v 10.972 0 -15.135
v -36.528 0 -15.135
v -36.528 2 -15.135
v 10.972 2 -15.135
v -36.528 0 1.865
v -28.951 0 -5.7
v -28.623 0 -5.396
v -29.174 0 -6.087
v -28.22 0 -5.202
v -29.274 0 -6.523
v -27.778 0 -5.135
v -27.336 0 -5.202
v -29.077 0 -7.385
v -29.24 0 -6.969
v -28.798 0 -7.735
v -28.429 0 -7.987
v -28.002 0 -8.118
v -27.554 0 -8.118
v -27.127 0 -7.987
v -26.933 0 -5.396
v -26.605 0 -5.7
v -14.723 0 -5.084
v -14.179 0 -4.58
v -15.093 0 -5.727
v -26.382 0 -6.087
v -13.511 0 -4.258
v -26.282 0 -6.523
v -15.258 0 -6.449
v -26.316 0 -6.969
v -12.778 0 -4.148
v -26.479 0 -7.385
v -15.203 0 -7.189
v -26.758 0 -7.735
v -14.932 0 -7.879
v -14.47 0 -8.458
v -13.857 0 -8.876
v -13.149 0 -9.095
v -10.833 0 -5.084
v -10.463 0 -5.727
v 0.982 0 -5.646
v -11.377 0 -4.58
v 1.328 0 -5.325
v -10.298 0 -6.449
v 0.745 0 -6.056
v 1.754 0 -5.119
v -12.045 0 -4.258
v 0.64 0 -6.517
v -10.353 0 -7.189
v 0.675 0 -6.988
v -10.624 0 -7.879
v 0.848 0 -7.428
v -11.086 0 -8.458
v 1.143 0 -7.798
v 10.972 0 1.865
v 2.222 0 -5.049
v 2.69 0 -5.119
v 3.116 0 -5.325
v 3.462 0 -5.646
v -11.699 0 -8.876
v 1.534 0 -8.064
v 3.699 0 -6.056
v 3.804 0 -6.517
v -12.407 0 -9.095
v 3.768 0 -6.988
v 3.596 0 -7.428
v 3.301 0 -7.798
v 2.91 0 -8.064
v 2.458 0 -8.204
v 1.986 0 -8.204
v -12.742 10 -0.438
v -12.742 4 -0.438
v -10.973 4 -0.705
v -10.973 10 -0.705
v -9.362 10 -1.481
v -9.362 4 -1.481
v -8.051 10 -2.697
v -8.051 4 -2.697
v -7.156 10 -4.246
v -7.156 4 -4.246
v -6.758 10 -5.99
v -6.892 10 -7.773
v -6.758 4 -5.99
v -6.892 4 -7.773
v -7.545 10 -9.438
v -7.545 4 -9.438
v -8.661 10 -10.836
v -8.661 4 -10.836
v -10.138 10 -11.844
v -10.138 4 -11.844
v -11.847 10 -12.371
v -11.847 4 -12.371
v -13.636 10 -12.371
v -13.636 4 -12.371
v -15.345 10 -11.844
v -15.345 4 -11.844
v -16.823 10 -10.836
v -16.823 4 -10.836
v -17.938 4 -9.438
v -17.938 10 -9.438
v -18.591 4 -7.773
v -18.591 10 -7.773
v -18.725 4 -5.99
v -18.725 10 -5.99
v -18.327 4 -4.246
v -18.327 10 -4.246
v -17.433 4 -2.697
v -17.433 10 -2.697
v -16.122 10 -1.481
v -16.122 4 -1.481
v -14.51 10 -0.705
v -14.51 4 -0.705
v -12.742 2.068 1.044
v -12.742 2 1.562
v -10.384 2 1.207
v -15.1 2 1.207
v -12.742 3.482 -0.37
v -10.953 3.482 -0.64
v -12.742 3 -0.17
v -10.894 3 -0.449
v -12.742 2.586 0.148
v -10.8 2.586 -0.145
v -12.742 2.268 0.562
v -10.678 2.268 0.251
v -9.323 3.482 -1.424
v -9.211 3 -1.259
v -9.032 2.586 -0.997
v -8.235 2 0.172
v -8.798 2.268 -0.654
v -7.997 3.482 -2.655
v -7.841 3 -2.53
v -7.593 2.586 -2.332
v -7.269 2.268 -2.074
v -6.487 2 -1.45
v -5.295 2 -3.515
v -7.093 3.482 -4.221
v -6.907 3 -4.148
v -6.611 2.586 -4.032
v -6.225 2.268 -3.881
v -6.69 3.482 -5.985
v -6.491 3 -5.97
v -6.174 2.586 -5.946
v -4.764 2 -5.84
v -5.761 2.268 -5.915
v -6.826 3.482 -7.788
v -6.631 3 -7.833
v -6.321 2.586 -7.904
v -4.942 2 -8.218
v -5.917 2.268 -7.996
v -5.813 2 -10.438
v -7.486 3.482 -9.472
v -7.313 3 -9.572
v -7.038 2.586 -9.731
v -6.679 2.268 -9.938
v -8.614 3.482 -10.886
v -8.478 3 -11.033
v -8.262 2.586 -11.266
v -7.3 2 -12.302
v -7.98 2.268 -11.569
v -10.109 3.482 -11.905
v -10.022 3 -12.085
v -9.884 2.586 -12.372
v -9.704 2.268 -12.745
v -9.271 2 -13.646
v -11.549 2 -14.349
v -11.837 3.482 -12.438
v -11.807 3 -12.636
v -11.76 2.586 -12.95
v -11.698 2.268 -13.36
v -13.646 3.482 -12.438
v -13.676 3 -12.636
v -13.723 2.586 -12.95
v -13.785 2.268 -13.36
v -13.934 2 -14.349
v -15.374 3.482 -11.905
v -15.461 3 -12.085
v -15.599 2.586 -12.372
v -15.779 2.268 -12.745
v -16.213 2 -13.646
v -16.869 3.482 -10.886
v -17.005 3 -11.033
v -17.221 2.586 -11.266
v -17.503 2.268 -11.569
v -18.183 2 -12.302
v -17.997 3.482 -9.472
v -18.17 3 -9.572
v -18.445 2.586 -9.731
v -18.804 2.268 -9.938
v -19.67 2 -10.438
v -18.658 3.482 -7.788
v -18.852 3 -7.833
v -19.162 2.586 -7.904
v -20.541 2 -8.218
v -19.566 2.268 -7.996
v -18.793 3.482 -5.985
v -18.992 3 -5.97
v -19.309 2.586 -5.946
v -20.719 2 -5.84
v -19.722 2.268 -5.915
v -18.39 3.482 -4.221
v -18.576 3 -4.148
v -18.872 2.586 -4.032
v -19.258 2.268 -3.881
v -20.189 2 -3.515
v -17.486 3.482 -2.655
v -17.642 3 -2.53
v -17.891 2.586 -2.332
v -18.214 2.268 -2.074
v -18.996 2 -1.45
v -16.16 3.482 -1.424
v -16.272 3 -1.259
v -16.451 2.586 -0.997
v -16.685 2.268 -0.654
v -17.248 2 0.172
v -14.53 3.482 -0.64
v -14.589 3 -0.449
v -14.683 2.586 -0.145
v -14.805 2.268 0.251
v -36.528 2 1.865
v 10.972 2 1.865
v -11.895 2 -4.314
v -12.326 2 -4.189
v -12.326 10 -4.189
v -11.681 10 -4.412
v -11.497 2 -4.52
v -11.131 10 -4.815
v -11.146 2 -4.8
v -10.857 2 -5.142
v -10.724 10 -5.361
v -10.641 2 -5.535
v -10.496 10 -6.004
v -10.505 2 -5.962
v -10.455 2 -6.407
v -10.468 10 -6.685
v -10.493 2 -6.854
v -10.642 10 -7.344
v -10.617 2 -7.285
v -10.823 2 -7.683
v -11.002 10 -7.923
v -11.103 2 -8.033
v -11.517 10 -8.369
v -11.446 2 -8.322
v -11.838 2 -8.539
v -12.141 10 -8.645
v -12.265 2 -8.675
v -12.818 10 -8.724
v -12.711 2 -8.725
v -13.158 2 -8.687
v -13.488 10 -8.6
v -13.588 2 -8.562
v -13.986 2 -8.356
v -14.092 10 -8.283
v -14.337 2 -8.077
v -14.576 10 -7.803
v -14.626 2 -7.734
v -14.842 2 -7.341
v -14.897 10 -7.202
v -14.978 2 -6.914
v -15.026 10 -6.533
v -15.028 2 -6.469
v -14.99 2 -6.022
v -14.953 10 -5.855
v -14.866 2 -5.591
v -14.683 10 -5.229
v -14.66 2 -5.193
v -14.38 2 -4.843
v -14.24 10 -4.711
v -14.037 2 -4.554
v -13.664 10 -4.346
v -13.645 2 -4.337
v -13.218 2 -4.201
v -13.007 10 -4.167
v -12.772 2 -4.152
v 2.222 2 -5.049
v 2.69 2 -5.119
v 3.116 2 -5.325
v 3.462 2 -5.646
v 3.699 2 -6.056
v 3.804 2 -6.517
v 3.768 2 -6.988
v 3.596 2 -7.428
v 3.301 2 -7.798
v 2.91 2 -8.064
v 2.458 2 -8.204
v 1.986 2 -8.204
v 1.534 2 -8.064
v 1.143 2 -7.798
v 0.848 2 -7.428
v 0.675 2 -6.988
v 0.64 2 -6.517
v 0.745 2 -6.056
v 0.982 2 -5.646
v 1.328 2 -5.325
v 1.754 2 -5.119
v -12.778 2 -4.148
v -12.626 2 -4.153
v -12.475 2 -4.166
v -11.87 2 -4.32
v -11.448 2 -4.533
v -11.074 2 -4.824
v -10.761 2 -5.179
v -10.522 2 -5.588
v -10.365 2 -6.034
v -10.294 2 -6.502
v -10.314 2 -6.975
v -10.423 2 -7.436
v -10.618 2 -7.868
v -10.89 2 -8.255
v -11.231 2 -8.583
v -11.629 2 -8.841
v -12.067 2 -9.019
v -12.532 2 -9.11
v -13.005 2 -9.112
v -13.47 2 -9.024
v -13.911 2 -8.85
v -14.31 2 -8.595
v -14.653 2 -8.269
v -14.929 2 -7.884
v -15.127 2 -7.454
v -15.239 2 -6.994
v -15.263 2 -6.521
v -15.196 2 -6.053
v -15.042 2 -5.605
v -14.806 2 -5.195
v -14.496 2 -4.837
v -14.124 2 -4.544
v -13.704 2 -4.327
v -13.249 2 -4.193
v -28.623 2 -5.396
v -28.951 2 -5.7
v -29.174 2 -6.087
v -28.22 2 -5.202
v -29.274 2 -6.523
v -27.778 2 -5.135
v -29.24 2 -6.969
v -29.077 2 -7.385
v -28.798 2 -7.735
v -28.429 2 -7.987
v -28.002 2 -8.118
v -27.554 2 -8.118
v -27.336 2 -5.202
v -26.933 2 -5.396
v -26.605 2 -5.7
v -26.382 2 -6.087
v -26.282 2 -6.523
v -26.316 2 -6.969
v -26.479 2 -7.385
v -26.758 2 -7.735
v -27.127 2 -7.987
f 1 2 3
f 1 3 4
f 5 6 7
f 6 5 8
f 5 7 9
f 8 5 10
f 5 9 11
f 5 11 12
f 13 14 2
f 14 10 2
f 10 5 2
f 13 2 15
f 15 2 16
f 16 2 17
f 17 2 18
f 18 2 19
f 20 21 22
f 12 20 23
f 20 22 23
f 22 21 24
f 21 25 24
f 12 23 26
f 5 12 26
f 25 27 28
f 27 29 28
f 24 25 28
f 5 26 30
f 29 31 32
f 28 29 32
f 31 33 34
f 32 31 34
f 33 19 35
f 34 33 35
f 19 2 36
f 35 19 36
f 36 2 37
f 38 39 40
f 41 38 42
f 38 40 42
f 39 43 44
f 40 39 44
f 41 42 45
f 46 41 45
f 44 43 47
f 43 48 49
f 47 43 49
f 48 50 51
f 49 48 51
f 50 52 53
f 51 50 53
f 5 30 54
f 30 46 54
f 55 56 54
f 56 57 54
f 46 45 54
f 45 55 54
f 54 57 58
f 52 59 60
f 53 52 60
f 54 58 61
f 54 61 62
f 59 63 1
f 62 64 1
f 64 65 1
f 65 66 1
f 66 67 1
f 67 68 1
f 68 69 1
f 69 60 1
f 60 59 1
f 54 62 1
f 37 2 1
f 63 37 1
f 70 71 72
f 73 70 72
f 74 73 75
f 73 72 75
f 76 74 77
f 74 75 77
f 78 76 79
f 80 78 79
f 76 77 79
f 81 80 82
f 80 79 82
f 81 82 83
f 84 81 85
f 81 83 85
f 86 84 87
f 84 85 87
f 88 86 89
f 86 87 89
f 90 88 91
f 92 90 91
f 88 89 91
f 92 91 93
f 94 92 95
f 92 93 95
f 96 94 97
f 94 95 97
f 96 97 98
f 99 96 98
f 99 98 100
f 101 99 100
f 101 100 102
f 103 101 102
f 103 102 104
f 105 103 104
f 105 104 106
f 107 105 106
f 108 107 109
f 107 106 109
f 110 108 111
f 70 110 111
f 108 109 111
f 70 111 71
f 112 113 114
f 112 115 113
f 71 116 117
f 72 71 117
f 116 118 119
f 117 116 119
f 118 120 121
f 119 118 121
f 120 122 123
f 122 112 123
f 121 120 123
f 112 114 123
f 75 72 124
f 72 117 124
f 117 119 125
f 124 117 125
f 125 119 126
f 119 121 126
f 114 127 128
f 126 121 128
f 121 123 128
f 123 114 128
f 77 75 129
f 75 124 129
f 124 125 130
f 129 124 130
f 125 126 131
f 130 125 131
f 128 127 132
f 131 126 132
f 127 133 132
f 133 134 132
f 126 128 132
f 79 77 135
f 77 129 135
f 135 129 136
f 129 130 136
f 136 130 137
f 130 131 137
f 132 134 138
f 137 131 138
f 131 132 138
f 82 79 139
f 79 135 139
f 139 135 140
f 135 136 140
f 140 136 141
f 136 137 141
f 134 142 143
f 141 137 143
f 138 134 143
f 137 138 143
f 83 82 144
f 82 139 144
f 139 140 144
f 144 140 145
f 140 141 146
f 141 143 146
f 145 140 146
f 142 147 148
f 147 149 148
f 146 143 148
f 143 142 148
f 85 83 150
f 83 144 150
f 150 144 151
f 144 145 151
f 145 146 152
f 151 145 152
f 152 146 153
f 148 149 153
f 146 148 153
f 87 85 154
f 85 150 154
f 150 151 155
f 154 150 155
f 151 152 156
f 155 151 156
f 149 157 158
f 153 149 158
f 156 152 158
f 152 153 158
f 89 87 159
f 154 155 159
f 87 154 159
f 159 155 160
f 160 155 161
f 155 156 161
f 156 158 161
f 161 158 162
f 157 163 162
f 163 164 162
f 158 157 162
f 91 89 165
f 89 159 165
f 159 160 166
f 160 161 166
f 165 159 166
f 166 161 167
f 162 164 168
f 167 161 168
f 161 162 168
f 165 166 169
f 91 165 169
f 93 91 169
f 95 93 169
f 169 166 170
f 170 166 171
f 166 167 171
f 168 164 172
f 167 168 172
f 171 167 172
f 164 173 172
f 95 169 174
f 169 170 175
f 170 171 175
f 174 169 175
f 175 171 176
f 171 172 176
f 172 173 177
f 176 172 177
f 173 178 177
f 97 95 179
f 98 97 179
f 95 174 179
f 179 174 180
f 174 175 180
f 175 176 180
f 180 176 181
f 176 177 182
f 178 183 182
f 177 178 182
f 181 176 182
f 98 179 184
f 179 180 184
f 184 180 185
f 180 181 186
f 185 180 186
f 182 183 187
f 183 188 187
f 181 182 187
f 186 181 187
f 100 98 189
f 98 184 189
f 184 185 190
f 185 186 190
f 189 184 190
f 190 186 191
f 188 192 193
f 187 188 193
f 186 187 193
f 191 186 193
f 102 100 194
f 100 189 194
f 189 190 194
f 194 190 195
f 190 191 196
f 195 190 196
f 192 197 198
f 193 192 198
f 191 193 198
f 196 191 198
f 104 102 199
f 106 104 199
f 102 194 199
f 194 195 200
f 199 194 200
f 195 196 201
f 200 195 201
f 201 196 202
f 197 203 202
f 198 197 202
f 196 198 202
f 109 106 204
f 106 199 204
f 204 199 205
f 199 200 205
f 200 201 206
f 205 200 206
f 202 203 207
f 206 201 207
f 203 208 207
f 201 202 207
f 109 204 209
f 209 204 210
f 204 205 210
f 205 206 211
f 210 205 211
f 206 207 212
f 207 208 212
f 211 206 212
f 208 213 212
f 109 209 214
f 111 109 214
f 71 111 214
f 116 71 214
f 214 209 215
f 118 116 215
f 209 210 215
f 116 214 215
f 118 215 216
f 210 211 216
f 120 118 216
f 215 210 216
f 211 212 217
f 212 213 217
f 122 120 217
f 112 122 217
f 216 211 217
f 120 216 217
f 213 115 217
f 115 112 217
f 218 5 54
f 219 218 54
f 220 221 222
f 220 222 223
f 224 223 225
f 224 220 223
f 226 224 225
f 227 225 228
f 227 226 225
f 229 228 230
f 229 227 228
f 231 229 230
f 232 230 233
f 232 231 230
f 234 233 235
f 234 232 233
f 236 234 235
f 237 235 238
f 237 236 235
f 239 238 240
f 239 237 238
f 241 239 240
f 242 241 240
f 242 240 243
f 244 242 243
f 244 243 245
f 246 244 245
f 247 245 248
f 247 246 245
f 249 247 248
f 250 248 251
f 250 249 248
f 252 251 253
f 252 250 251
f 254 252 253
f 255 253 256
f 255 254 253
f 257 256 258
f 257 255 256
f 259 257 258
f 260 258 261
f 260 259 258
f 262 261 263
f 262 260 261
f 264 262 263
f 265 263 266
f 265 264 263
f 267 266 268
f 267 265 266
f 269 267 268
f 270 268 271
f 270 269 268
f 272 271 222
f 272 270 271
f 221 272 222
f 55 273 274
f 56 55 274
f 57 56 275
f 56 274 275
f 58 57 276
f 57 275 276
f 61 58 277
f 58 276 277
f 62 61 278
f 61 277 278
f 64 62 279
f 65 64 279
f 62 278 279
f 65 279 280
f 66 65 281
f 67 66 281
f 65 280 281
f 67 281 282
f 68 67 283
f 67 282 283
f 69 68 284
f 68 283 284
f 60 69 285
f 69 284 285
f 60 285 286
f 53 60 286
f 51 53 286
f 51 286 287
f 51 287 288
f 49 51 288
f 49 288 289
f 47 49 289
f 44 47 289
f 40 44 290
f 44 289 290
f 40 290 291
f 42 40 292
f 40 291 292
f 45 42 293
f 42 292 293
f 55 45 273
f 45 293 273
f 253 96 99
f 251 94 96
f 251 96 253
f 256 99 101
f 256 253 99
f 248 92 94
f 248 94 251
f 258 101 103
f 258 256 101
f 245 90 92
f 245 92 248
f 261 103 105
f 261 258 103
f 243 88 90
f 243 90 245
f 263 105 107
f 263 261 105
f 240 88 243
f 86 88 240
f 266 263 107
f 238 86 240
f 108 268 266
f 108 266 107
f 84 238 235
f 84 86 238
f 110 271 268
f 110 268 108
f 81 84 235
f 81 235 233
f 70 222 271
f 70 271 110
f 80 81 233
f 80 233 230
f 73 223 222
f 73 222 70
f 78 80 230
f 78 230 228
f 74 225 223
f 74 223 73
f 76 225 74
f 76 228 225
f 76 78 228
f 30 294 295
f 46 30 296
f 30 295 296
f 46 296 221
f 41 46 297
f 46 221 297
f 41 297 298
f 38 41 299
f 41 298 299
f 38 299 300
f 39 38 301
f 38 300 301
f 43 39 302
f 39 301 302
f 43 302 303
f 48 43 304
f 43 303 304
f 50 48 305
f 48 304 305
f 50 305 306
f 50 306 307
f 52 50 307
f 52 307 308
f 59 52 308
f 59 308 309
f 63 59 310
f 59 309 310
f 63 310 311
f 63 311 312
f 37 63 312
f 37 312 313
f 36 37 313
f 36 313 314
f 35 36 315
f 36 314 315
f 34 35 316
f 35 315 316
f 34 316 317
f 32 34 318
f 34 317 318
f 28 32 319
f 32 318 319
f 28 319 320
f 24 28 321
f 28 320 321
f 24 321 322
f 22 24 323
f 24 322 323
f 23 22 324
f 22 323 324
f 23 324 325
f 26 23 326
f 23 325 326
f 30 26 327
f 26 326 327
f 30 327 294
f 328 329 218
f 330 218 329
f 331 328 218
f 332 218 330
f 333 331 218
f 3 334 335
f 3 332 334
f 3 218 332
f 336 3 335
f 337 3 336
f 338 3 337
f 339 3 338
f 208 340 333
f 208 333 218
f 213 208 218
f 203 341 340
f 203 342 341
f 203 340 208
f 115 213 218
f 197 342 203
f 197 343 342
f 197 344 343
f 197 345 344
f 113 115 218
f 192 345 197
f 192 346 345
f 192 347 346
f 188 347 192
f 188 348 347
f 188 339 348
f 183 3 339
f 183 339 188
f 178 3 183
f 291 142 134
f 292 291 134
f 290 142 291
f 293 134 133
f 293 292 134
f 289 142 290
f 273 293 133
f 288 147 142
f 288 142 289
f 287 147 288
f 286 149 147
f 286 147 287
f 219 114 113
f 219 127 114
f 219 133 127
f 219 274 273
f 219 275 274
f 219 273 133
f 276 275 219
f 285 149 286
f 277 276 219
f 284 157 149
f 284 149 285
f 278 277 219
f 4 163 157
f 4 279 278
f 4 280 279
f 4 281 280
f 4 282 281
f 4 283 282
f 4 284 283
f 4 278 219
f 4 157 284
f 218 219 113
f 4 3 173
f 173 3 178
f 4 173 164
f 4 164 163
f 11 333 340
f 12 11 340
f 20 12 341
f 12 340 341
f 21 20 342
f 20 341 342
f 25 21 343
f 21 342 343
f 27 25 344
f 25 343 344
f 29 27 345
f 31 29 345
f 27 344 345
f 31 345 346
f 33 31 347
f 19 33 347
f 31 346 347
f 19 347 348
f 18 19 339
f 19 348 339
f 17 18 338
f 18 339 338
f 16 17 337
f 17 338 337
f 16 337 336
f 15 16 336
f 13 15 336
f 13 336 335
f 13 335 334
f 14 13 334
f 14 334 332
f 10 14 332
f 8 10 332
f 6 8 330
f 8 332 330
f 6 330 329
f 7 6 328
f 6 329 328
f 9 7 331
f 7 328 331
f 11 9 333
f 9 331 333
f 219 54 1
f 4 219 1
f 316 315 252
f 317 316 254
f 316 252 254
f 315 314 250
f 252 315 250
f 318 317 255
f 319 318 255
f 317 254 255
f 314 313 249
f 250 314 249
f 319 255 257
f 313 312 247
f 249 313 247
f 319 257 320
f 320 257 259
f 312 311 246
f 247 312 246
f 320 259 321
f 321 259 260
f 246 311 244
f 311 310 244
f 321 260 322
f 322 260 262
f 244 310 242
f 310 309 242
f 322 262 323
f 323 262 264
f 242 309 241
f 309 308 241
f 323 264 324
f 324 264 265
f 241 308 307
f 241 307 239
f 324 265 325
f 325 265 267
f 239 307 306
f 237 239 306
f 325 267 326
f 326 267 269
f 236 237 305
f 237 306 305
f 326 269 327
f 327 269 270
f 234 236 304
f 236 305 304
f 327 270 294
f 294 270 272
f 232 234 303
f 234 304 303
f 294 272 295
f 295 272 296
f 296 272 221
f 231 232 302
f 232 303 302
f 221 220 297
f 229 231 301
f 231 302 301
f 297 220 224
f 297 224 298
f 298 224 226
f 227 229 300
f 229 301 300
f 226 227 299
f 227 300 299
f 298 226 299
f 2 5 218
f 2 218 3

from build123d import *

# Parameters (mm, degrees)
SKETCH1_W           = 47.5
SKETCH1_H           = 17
BOSS_EXTRUDE1_DEPTH = 2
SKETCH2_R           = 2.487228871
SKETCH2_R_2         = 1.586318918
SKETCH2_R_3         = 1.5
CUT_EXTRUDE2_DEPTH  = 2
SKETCH5_R           = 6
SKETCH5_R_2         = 2.286753702
BOSS_EXTRUDE3_DEPTH = 8
FILLET1_R           = 2


with BuildPart() as part:
    # Sketch1 → Boss-Extrude1 (new body)
    with BuildSketch(Plane(origin=(0, 0, 0), x_dir=(1, 0, 0), z_dir=(0, 1, 0))):
        with Locations((-12.778061224, 6.635204082)):
            Rectangle(SKETCH1_W, SKETCH1_H)
    extrude(amount=BOSS_EXTRUDE1_DEPTH)

    # Sketch2 → Cut-Extrude2 (cut)
    with BuildSketch(Plane(origin=(0, 2, 0), x_dir=(1, 0, 0), z_dir=(0, 1, 0))):
        with Locations(Location((-12.778061224, 6.635204082, 0), (0, 0, 270))):
            Circle(SKETCH2_R)
        with Locations(Location((2.221938776, 6.635204082, 0), (0, 0, 270))):
            Circle(SKETCH2_R_2)
        with Locations(Location((-27.778061224, 6.635204082, 0), (0, 0, 270))):
            Circle(SKETCH2_R_3)
    extrude(amount=-CUT_EXTRUDE2_DEPTH, mode=Mode.SUBTRACT)

    # Sketch5 → Boss-Extrude3 (add)
    with BuildSketch(Plane(origin=(0, 2, 0), x_dir=(1, 0, 0), z_dir=(0, 1, 0))):
        with Locations(Location((-12.741585604, 6.438075133, 0), (0, 0, 270))):
            Circle(SKETCH5_R)
        with Locations(Location((-12.741585604, 6.438075133, 0), (0, 0, 280.48311938))):
            Circle(SKETCH5_R_2, mode=Mode.SUBTRACT)
    extrude(amount=BOSS_EXTRUDE3_DEPTH)

    # Fillet1
    fillet1_edges = [part.edges().sort_by_distance(p)[0] for p in [
        (-12.741585604, 2, -12.438075133),
    ]]
    fillet(fillet1_edges, radius=FILLET1_R)


solid = part.part
